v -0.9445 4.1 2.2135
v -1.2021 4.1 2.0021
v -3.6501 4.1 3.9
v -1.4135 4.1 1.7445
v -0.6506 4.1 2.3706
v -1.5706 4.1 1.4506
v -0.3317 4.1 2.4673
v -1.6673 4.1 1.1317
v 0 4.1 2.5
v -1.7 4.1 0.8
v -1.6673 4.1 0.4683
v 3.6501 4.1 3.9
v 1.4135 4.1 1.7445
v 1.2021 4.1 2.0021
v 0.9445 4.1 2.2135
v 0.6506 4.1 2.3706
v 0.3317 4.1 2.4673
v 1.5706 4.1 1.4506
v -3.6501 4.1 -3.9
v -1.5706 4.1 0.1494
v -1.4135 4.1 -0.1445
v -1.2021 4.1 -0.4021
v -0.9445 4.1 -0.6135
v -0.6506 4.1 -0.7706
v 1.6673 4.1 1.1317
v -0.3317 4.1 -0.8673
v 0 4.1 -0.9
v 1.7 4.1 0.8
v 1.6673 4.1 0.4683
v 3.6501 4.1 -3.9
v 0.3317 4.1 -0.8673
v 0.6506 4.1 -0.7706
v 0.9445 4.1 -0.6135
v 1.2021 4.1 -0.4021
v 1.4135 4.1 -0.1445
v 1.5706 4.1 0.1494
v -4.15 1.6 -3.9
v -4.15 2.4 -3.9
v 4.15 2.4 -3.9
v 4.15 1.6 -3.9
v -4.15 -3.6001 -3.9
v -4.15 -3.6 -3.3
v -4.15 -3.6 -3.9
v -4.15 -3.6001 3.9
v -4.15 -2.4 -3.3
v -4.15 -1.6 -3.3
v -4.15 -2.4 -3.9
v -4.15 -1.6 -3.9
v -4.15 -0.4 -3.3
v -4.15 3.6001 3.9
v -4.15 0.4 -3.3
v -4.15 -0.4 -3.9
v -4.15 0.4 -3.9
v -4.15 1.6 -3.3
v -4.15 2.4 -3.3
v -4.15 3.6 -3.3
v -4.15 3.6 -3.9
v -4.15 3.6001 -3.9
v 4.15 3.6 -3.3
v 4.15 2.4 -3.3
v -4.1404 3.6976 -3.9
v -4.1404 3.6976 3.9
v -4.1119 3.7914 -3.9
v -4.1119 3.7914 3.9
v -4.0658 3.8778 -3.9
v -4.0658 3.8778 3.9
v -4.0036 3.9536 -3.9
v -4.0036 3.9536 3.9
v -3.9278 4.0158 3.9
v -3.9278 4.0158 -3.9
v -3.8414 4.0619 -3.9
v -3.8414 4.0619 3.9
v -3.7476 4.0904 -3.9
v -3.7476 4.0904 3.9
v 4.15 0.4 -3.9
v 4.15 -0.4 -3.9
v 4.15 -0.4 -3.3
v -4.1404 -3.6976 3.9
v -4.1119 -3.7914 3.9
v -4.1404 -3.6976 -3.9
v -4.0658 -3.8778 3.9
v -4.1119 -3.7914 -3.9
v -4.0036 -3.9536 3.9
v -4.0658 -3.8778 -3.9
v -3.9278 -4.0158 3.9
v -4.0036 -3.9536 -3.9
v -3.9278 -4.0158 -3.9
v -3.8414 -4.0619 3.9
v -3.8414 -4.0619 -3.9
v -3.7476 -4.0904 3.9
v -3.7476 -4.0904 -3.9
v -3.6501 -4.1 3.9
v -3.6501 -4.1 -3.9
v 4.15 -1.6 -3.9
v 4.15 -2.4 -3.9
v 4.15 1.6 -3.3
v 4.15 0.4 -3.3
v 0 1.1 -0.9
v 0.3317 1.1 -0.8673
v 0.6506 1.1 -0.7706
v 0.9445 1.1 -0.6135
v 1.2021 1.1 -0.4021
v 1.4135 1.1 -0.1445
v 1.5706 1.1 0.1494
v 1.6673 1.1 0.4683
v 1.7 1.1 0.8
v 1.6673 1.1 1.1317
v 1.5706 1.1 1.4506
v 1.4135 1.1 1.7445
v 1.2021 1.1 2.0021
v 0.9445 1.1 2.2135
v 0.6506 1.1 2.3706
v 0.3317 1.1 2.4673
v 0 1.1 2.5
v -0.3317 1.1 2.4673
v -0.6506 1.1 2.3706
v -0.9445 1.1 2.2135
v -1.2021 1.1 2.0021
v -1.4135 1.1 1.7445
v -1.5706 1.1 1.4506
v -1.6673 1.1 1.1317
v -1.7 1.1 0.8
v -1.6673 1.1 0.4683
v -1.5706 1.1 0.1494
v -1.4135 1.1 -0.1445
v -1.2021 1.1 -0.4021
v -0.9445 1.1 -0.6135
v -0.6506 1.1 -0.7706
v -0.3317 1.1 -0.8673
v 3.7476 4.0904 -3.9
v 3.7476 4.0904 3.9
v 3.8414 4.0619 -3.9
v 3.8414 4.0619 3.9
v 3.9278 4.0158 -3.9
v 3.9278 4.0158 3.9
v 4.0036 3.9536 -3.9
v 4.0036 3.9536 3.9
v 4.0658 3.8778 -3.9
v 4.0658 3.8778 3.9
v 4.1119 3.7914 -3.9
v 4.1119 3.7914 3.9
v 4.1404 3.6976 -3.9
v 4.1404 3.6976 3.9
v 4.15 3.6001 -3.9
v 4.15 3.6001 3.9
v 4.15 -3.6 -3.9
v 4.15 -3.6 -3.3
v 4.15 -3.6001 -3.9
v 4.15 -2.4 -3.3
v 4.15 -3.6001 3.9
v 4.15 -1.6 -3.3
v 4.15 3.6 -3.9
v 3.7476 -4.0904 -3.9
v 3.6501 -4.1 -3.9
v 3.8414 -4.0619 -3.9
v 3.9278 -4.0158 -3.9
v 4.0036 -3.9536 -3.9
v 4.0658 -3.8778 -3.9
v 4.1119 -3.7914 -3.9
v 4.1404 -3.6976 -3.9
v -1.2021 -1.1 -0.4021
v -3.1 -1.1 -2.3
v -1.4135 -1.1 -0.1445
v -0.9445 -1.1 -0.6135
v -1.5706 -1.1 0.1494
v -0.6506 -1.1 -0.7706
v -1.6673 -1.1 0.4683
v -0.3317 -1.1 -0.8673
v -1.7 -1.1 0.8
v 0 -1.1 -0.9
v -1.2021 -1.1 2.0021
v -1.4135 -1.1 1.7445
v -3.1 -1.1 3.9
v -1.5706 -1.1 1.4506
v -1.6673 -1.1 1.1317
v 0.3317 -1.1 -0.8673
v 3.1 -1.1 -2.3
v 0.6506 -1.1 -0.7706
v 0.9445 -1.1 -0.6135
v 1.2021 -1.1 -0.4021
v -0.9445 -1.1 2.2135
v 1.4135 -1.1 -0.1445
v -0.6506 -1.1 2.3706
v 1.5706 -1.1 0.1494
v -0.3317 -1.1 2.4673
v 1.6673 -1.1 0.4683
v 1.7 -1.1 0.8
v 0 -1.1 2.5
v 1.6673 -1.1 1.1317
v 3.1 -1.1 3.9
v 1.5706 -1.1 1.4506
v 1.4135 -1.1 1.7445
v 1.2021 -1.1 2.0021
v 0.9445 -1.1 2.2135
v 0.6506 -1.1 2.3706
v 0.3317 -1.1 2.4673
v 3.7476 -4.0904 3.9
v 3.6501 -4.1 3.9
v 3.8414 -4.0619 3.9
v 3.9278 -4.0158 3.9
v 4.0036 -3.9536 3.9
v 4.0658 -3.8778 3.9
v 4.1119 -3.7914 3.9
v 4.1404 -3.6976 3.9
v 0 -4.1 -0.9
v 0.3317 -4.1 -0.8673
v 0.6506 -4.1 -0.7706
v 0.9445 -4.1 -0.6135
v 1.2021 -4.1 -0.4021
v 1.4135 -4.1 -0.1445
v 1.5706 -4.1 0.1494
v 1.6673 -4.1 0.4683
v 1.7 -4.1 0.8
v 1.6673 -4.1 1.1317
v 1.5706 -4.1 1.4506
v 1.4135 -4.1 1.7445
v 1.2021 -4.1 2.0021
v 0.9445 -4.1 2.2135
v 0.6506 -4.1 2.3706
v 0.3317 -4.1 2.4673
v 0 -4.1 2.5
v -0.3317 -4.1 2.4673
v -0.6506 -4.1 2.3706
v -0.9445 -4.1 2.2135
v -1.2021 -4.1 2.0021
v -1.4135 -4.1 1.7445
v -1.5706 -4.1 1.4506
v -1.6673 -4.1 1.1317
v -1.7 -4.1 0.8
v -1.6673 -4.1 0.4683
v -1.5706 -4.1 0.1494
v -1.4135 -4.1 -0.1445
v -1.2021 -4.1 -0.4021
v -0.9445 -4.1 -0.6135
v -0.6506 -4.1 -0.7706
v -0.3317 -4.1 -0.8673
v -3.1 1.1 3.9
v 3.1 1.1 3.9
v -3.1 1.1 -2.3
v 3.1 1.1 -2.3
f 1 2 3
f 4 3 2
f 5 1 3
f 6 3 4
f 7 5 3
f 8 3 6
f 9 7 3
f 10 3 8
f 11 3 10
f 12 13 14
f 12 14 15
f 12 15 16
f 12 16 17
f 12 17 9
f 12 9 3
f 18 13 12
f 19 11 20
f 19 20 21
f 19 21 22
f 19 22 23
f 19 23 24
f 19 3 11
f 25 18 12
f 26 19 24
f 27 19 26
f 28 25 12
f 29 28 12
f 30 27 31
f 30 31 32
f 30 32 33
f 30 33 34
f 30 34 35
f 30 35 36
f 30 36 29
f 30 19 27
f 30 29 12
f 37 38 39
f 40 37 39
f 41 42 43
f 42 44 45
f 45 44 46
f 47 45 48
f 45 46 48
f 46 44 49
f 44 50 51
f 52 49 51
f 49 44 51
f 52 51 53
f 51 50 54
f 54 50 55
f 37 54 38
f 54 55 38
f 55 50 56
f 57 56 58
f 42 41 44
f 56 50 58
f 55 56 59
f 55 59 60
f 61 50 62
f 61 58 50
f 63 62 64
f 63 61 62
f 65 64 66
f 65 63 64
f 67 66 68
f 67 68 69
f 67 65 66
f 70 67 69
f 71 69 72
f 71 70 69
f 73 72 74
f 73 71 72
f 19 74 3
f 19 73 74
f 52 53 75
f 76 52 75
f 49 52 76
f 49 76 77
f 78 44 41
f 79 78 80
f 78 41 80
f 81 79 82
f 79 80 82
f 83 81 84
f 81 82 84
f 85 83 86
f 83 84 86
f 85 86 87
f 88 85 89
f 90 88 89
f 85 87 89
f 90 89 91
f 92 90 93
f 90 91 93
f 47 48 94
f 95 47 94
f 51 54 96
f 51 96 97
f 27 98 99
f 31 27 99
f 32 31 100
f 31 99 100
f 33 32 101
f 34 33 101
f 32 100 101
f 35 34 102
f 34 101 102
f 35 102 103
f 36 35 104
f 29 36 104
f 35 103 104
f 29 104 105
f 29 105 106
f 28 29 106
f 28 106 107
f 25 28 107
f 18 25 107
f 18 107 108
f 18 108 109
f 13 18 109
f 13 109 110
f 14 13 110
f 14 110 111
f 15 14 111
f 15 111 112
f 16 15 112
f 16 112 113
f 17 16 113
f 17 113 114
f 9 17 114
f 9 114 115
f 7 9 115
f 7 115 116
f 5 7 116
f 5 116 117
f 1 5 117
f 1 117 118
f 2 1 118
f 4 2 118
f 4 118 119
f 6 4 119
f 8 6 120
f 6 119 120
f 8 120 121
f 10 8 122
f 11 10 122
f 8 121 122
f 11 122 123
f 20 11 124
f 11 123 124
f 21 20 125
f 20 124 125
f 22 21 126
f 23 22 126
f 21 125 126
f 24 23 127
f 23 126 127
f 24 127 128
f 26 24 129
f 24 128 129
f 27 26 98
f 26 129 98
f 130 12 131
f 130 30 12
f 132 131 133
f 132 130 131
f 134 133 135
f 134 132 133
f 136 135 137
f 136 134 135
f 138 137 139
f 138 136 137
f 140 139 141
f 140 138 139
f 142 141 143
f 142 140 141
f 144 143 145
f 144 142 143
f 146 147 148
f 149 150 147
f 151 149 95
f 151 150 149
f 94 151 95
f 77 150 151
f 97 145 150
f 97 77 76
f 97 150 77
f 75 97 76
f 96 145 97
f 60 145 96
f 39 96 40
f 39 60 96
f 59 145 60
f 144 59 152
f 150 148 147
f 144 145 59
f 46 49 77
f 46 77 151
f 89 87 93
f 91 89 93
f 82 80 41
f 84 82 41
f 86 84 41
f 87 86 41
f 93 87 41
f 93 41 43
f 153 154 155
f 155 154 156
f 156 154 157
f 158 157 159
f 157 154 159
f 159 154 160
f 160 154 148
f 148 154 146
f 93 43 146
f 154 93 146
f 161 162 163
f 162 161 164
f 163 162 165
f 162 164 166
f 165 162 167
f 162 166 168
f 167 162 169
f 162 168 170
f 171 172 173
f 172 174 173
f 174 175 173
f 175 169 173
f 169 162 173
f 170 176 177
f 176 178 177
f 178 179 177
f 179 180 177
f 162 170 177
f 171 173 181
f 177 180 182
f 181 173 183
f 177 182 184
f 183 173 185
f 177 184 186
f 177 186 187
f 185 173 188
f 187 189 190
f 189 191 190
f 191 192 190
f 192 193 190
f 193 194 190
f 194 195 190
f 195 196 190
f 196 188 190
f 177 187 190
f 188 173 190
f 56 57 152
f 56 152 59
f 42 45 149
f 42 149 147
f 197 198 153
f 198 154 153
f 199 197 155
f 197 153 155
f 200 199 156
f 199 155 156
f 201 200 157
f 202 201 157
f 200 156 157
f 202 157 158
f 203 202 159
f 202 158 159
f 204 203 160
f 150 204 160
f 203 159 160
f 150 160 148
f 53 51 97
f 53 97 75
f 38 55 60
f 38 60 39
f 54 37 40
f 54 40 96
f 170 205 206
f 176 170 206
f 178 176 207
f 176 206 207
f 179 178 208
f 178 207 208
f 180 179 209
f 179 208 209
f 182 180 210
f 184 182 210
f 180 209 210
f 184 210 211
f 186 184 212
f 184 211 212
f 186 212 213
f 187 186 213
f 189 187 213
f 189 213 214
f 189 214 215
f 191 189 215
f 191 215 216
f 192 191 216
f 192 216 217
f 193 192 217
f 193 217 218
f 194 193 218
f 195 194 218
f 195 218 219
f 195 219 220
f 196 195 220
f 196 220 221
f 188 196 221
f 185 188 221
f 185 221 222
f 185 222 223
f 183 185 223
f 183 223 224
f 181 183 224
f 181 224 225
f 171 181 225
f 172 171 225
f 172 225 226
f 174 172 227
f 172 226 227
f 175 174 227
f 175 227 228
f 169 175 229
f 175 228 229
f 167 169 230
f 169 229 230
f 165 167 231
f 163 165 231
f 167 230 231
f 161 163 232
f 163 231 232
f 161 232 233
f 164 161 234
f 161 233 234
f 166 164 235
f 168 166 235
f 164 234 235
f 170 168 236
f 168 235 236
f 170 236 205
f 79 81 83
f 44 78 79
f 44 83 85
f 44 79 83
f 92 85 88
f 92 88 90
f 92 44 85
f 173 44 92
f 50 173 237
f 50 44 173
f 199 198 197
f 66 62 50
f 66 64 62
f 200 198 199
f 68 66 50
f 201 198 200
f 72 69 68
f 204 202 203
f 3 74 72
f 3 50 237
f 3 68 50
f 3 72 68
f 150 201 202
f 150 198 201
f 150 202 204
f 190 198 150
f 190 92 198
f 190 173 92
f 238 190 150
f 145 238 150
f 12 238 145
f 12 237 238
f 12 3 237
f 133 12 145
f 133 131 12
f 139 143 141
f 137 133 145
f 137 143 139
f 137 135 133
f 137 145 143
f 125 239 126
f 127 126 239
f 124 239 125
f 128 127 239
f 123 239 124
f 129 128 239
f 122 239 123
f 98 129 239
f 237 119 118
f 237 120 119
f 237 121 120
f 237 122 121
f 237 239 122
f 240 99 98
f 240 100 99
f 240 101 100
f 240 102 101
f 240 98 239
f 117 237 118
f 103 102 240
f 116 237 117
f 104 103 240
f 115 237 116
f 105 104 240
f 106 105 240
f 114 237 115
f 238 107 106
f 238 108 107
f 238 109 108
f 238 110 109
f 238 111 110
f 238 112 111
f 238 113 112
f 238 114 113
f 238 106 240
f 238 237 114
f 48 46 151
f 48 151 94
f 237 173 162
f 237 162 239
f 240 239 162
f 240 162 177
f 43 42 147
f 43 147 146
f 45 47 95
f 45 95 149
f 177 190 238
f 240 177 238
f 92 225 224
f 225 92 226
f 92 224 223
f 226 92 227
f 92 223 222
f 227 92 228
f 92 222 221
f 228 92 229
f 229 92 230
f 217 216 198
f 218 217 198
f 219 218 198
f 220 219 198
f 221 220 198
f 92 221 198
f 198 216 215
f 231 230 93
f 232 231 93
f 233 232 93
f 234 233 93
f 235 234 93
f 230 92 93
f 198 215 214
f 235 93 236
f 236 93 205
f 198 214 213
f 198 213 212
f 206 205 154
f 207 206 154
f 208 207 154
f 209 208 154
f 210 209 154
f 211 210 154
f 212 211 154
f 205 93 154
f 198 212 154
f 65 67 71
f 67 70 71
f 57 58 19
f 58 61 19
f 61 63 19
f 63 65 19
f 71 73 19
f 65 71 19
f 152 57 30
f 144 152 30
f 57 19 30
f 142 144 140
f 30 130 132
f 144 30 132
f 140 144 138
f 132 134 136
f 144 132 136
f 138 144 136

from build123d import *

# Parameters (mm, degrees)
SKETCH1_W           = 8.3
SKETCH1_H           = 7.8
BOSS_EXTRUDE1_DEPTH = 4.1
CUT_EXTRUDE1_DEPTH  = 11.045396956
SKETCH4_W           = 6.2
SKETCH4_H           = 2.2
CUT_EXTRUDE2_DEPTH  = 6.2
SKETCH5_R           = 1.7
CUT_EXTRUDE3_DEPTH  = 10.983611571
FILLET1_R           = 0.5


with BuildPart() as part:
    # Sketch1 → Boss-Extrude1 (new, symmetric)
    with BuildSketch(Plane(origin=(0, 0, 0), x_dir=(1, 0, 0), z_dir=(0, 1, 0))):
        Rectangle(SKETCH1_W, SKETCH1_H)
    extrude(amount=BOSS_EXTRUDE1_DEPTH, both=True)

    # Sketch2 → Cut-Extrude1 (cut, through all)
    with BuildSketch(Plane.ZY.offset(4.15)):
        Polygon((-8.9, 3.6), (-3.3, 3.6), (-3.3, 2.4), (-3.9, 2.4), (-3.9, 1.6), (-3.3, 1.6), (-3.3, 0.4), (-3.9, 0.4), (-3.9, -0.4), (-3.3, -0.4), (-3.3, -1.6), (-3.9, -1.6), (-3.9, -2.4), (-3.3, -2.4), (-3.3, -3.6), (-8.9, -3.6), align=None)
    extrude(amount=-CUT_EXTRUDE1_DEPTH, mode=Mode.SUBTRACT)

    # Sketch4 → Cut-Extrude2 (cut)
    with BuildSketch(Plane.XY.offset(3.9)):
        Rectangle(SKETCH4_W, SKETCH4_H)
    extrude(amount=-CUT_EXTRUDE2_DEPTH, mode=Mode.SUBTRACT)

    # Sketch5 → Cut-Extrude3 (cut, through all)
    with BuildSketch(Plane.XZ.offset(4.1)):
        with Locations(Location((0, 0.8, 0), (0, 0, 270))):
            Circle(SKETCH5_R)
    extrude(amount=-CUT_EXTRUDE3_DEPTH, mode=Mode.SUBTRACT)

    # Fillet1
    fillet1_edges = [part.edges().sort_by_distance(p)[0] for p in [
        (4.15, 4.1, 0),
        (4.15, -4.1, 0),
        (-4.15, 4.1, 0),
        (-4.15, -4.1, 0),
    ]]
    fillet(fillet1_edges, radius=FILLET1_R - 0.0001)  # a hair under: the kernel refuses the full size


solid = part.part
